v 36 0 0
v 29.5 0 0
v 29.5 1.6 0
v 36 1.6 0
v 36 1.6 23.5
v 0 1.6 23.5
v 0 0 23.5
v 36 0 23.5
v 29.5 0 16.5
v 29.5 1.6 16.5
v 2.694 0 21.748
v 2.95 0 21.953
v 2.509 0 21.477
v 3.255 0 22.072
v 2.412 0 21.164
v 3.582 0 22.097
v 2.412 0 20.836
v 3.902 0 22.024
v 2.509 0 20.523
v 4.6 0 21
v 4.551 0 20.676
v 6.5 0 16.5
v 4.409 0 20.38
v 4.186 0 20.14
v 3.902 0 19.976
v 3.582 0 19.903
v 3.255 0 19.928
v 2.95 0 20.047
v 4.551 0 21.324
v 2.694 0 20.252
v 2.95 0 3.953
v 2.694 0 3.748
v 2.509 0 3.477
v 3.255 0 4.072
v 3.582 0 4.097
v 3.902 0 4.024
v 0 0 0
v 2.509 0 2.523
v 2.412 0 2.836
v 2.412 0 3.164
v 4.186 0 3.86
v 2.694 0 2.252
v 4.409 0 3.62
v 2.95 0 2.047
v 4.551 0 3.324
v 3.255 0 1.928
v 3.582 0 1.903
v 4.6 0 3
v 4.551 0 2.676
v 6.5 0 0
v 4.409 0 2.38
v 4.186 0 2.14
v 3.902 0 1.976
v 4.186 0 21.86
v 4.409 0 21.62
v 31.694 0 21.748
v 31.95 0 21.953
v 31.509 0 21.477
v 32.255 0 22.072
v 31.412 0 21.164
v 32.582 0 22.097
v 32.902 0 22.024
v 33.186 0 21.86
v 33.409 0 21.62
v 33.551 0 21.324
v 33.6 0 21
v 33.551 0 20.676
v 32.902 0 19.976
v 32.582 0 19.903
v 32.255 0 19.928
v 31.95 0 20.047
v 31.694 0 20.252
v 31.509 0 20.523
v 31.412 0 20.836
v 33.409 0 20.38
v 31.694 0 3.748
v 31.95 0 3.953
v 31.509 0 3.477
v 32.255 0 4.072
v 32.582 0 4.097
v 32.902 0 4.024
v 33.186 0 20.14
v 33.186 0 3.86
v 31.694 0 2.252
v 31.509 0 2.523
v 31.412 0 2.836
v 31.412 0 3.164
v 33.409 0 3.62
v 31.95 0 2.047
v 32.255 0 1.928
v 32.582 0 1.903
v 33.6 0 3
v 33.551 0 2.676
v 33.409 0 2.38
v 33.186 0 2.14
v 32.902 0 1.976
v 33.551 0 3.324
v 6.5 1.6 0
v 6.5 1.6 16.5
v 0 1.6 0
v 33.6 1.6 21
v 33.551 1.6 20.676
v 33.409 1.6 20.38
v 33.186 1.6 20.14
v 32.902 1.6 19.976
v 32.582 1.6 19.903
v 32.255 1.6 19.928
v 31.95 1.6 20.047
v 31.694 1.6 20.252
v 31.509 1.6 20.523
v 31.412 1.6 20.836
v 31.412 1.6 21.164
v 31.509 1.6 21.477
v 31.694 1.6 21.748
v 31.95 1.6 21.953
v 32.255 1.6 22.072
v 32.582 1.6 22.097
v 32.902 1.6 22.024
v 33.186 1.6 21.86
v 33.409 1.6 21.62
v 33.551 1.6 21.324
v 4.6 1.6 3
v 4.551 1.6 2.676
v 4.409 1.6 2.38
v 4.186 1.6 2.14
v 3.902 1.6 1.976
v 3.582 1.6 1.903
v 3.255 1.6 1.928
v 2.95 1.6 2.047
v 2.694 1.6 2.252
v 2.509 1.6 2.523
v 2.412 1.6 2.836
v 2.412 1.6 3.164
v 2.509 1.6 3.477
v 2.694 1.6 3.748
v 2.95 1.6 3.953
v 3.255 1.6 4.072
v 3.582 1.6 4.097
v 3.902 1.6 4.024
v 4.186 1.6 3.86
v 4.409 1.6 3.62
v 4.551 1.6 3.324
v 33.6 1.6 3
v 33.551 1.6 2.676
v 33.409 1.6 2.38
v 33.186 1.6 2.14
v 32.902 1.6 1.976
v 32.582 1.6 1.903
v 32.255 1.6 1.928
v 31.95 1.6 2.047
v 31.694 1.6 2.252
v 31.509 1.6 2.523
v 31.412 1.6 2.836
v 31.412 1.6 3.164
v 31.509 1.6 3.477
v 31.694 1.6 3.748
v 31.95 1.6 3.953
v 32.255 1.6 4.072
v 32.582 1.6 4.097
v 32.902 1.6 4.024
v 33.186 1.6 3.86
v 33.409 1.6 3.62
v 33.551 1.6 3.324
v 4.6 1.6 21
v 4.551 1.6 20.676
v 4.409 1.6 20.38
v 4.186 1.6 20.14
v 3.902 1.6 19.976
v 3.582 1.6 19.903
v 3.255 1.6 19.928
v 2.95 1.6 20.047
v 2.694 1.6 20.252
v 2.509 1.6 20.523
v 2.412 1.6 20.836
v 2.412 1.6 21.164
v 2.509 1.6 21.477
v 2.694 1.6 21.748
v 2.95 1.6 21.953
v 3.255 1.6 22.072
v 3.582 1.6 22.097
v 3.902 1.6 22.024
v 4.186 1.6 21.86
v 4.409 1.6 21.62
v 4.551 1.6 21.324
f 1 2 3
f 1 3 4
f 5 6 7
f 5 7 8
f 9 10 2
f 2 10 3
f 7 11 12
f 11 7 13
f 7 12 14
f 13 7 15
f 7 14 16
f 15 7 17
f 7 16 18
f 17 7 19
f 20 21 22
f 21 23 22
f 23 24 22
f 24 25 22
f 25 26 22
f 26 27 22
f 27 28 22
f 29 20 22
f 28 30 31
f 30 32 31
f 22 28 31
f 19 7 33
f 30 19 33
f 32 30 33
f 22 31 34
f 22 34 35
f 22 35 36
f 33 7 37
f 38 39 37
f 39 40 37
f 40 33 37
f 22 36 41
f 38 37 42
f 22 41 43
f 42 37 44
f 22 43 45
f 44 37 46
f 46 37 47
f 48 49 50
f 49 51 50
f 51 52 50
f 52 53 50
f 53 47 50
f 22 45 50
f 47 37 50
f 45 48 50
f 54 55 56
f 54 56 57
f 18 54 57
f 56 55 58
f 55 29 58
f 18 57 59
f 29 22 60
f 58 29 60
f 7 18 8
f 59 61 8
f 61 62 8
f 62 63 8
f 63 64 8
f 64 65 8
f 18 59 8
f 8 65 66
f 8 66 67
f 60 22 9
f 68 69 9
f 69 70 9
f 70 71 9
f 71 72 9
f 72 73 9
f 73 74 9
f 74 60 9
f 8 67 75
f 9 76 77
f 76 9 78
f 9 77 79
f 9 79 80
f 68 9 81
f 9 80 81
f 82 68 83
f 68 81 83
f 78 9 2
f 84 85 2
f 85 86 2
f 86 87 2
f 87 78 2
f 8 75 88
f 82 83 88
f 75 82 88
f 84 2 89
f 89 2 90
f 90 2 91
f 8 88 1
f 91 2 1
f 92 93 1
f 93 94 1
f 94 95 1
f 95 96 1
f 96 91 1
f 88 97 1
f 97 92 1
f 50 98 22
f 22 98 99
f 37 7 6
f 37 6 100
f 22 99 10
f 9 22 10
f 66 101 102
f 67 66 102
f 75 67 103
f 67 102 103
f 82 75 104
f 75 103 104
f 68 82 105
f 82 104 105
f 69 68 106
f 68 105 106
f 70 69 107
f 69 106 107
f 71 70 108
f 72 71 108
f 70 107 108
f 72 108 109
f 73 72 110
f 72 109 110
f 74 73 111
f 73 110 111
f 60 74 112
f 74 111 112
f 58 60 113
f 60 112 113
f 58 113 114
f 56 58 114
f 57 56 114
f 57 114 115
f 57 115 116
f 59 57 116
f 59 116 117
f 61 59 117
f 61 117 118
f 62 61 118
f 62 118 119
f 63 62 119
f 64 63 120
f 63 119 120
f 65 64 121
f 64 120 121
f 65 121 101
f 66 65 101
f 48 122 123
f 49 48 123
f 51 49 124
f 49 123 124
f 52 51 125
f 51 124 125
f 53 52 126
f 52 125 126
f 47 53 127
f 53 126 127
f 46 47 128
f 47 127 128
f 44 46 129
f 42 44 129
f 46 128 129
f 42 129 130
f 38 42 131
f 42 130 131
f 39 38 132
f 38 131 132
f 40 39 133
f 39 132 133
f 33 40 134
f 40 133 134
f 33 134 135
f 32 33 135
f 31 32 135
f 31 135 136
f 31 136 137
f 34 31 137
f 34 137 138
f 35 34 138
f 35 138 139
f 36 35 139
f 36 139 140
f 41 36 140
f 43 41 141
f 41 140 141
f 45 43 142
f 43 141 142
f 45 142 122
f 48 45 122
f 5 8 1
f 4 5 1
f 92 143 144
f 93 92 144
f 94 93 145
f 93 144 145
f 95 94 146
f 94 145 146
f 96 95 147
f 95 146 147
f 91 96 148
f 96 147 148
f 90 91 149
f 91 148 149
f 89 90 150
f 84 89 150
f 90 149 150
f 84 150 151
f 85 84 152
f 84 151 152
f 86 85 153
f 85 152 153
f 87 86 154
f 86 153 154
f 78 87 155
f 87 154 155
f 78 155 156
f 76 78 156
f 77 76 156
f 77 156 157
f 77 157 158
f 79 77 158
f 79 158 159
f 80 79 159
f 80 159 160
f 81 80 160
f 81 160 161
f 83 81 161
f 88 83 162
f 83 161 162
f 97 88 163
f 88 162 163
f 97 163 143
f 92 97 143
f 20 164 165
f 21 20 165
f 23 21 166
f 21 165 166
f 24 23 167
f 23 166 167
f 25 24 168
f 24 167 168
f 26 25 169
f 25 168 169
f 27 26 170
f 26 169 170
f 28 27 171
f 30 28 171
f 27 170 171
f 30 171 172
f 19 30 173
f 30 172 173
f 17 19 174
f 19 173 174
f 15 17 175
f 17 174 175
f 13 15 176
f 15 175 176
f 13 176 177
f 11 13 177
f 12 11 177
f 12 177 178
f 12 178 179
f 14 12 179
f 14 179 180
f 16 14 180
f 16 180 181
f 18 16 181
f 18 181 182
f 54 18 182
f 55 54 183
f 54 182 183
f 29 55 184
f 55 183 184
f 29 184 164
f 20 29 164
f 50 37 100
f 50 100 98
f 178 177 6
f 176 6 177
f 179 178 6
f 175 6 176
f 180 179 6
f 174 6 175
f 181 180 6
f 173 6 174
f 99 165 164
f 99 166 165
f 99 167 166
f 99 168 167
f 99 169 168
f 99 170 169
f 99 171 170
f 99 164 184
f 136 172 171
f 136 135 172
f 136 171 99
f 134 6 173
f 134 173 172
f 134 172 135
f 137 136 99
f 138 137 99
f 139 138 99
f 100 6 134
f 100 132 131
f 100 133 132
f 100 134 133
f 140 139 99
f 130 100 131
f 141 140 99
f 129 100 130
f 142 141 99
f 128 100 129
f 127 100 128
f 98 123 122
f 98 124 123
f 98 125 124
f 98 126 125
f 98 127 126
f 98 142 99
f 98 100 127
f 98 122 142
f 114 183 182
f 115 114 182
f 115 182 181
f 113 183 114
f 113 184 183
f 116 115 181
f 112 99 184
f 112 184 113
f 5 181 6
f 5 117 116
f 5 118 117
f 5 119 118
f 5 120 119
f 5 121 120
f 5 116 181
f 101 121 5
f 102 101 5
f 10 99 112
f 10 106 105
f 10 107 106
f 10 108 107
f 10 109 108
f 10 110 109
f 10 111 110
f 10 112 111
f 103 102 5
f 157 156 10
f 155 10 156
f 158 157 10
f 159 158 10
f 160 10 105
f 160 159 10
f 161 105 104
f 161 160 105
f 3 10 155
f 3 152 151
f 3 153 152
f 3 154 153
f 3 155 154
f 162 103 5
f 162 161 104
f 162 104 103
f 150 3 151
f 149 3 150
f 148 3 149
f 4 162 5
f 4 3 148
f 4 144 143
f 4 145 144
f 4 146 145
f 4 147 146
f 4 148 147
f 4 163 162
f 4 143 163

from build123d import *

# Parameters (mm, degrees)
SKETCH_1_W          = 36
SKETCH_1_H          = 24
EXTRUDE_3_DEPTH     = 1.6
SKETCH_3_W          = 22
SKETCH_3_H          = 16
CUT_EXTRUDE_1_DEPTH = 1.6
SKETCH_4_R          = 1.1
CUT_EXTRUDE_2_DEPTH = 1.6
CUT_EXTRUDE_3_DEPTH = 3
SKETCH_6_W          = 36
SKETCH_6_H          = 0.5
CUT_EXTRUDE_4_DEPTH = 3


with BuildPart() as part:
    # 草图1 → 凸台-拉伸3 (new body)
    with BuildSketch(Plane(origin=(0, 0, 0), x_dir=(1, 0, 0), z_dir=(0, 1, 0))):
        with Locations((18, -12)):
            Rectangle(SKETCH_1_W, SKETCH_1_H)
    extrude(amount=EXTRUDE_3_DEPTH)

    # 草图3 → 切除-拉伸1 (cut)
    with BuildSketch(Plane(origin=(0, 1.6, 0), x_dir=(1, 0, 0), z_dir=(0, 1, 0))):
        with Locations((18, -8)):
            Rectangle(SKETCH_3_W, SKETCH_3_H)
    extrude(amount=-CUT_EXTRUDE_1_DEPTH, mode=Mode.SUBTRACT)

    # 草图4 → 切除-拉伸2 (cut)
    with BuildSketch(Plane(origin=(0, 1.6, 0), x_dir=(1, 0, 0), z_dir=(0, 1, 0))):
        with Locations((3.5, -3)):
            Circle(SKETCH_4_R)
        with Locations((32.5, -3)):
            Circle(SKETCH_4_R)
        with Locations((3.5, -21)):
            Circle(SKETCH_4_R)
        with Locations((32.5, -21)):
            Circle(SKETCH_4_R)
    extrude(amount=-CUT_EXTRUDE_2_DEPTH, mode=Mode.SUBTRACT)

    # 草图5 → 切除-拉伸3 (cut)
    with BuildSketch(Plane(origin=(0, 1.6, 0), x_dir=(1, 0, 0), z_dir=(0, 1, 0))):
        Polygon((7, 0), (6.5, 0), (6.5, -16.5), (29.5, -16.5), (29.5, 0), (29, 0), (29, -16), (7, -16), align=None)
    extrude(amount=-CUT_EXTRUDE_3_DEPTH, mode=Mode.SUBTRACT)

    # 草图6 → 切除-拉伸4 (cut)
    with BuildSketch(Plane(origin=(0, 1.6, 0), x_dir=(1, 0, 0), z_dir=(0, 1, 0))):
        with Locations((18, -23.75)):
            Rectangle(SKETCH_6_W, SKETCH_6_H)
    extrude(amount=-CUT_EXTRUDE_4_DEPTH, mode=Mode.SUBTRACT)


solid = part.part
